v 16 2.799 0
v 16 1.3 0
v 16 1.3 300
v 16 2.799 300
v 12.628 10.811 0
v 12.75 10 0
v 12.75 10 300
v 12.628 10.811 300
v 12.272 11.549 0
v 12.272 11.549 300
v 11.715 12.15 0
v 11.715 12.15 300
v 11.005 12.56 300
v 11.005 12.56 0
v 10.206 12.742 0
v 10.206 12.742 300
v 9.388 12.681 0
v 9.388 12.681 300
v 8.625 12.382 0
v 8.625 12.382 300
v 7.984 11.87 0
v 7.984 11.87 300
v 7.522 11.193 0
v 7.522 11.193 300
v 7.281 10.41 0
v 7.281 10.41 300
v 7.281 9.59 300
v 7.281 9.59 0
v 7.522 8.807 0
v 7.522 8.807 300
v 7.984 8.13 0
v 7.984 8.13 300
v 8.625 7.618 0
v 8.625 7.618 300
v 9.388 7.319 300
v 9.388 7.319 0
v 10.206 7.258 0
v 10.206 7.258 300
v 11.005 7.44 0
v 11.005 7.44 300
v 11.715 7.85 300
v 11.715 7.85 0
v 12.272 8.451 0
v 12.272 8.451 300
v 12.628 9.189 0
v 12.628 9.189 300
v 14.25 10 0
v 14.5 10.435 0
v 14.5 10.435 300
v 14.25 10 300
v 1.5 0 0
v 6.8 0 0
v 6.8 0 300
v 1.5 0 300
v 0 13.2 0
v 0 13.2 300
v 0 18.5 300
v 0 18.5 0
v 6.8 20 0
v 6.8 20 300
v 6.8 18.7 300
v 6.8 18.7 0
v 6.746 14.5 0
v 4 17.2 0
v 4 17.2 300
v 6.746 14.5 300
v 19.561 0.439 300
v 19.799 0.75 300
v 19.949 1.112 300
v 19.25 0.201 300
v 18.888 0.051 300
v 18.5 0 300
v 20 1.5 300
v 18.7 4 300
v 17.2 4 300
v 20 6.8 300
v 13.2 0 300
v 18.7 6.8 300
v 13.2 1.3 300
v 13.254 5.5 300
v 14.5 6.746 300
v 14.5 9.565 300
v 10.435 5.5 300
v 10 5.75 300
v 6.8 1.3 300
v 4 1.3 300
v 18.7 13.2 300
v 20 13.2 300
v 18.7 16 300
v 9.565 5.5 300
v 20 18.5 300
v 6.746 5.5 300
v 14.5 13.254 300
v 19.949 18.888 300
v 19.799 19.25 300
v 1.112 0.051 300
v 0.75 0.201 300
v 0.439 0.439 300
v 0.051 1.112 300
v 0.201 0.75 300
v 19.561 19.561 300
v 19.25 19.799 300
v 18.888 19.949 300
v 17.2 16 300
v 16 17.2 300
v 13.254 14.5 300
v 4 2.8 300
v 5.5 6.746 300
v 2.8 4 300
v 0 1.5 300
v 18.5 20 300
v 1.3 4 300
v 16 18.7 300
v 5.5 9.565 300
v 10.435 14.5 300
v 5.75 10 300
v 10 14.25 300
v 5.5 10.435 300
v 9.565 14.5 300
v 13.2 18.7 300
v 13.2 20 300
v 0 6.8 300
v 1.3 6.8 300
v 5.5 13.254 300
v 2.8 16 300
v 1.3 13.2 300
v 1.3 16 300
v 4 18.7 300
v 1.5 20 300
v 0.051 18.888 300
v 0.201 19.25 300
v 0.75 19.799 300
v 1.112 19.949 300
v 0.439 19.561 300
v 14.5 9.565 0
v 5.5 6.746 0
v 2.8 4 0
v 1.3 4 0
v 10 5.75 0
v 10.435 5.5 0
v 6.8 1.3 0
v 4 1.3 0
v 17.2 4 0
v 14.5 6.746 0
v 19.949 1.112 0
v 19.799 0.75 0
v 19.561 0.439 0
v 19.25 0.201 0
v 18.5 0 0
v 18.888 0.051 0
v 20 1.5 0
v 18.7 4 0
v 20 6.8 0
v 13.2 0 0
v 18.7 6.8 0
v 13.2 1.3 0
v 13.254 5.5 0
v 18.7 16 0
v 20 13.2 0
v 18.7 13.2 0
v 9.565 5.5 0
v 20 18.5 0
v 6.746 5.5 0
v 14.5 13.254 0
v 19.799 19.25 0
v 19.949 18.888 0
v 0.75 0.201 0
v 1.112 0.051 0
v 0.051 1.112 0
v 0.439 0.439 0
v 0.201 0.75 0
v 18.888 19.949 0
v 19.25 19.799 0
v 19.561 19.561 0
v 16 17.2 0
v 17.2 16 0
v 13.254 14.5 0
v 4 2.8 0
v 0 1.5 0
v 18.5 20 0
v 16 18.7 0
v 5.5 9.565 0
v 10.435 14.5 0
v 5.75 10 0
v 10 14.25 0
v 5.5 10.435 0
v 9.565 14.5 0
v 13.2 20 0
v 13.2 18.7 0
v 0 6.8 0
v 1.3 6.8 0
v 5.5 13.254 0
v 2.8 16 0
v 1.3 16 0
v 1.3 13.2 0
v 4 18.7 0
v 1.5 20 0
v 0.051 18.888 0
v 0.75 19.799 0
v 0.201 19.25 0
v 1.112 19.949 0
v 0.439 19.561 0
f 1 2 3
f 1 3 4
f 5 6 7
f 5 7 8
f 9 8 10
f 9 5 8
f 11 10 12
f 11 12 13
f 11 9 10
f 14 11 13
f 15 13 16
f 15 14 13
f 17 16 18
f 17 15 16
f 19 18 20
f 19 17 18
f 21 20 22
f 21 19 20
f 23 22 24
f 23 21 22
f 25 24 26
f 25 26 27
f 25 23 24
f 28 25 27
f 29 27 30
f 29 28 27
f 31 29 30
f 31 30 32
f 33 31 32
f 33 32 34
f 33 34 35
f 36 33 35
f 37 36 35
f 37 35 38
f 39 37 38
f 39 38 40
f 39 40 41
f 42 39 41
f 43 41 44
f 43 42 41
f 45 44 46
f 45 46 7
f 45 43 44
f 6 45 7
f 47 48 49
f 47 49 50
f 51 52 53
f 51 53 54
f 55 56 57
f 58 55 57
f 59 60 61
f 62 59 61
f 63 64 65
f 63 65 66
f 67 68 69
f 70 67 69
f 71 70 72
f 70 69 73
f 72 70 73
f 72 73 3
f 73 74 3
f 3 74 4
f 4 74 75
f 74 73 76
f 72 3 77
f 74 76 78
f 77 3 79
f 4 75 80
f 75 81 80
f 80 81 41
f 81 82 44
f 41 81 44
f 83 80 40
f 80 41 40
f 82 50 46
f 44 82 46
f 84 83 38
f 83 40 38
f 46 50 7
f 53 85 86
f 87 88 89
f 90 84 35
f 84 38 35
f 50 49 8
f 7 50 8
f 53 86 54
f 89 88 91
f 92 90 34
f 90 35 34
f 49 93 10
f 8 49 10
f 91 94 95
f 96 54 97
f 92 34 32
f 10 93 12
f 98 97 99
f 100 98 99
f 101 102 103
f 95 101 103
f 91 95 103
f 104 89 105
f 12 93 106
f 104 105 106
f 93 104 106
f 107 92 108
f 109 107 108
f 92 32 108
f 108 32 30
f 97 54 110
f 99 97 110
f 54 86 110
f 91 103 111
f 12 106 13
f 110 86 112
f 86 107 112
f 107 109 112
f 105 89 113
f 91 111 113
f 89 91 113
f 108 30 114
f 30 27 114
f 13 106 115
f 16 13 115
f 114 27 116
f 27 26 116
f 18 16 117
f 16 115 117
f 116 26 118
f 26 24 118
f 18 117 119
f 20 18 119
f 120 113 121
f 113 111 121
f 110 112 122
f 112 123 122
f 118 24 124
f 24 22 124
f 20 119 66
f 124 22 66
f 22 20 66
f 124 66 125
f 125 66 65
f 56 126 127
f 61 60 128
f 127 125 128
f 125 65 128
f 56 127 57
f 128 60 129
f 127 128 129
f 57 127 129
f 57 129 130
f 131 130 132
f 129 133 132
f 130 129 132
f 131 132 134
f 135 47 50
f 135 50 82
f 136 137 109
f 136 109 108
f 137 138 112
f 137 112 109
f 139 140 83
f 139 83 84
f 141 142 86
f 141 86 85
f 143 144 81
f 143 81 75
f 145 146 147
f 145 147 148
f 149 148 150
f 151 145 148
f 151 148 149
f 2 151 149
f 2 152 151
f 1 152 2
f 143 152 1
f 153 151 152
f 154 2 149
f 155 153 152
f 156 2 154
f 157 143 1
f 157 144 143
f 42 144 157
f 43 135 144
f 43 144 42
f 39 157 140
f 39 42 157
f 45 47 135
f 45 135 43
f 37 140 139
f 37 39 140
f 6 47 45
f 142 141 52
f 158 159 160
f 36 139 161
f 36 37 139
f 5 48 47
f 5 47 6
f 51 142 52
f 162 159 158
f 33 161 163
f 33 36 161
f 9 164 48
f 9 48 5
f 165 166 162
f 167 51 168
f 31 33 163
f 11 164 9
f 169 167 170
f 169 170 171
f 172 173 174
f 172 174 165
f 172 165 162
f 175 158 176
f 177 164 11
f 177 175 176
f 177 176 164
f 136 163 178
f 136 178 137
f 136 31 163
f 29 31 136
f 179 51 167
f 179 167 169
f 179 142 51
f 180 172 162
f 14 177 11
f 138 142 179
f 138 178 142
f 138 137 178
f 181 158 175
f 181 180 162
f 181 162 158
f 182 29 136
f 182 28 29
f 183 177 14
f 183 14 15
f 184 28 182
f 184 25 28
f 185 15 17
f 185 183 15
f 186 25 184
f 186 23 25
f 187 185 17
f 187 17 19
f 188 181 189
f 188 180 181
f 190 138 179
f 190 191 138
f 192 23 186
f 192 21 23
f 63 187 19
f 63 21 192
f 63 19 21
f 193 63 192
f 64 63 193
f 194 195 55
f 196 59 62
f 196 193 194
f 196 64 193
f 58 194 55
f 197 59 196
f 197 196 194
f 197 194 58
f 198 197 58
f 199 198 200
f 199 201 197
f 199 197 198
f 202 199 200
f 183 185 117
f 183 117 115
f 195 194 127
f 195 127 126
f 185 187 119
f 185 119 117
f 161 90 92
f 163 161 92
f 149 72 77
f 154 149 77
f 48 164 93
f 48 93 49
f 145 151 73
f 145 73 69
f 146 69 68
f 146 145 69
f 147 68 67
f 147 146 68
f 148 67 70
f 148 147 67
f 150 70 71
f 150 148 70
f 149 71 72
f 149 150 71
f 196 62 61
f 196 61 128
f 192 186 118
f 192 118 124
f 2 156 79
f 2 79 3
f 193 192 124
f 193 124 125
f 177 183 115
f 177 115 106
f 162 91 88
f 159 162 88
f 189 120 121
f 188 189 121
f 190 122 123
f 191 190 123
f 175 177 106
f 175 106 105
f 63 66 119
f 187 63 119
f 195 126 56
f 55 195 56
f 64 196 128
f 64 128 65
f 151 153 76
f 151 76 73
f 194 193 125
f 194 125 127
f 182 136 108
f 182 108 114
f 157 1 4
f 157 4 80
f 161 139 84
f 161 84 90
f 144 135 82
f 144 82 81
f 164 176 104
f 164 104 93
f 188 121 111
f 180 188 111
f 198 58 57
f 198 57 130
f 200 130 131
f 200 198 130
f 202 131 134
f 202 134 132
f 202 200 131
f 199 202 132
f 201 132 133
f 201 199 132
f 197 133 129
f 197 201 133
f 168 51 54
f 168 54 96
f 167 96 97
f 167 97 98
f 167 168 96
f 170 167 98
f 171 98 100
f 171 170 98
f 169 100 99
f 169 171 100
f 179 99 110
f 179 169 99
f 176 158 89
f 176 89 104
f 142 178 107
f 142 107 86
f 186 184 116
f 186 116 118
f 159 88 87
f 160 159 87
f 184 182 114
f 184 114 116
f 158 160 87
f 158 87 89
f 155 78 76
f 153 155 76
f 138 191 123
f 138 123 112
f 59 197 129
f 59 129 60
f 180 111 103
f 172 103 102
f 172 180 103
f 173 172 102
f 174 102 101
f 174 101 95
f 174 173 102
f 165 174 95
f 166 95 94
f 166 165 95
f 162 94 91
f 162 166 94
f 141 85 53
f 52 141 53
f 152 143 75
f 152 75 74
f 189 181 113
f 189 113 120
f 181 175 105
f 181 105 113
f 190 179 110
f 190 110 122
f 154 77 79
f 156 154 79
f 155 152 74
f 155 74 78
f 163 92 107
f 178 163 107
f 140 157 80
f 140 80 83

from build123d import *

# Parameters (mm, degrees)
MODEL_R             = 2.75
BOSS_EXTRUDE1_DEPTH = 300


with BuildPart() as part:
    # Model → Boss-Extrude1 (new body)
    with BuildSketch(Plane.XY):
        with BuildLine():
            Line((1.499999935, 19.99999323), (6.799999935, 19.99999323))
            Line((6.799999935, 19.99999323), (6.799999935, 18.69999323))
            Line((6.799999935, 18.69999323), (3.999999935, 18.69999323))
            Line((3.999999935, 18.69999323), (3.999999935, 17.19999323))
            Line((3.999999935, 17.19999323), (6.745762647, 14.5))
            Line((6.745762647, 14.5), (9.565216879, 14.5))
            Line((9.565216879, 14.5), (10, 14.25))
            Line((10, 14.25), (10.434782606, 14.5))
            Line((10.434782606, 14.5), (13.254244108, 14.5))
            Line((13.254244108, 14.5), (15.999999935, 17.19999323))
            Line((15.999999935, 17.19999323), (15.999999935, 18.69999323))
            Line((15.999999935, 18.69999323), (13.199999935, 18.69999323))
            Line((13.199999935, 18.69999323), (13.199999935, 19.99999323))
            Line((13.199999935, 19.99999323), (18.499999935, 19.99999323))
            ThreePointArc((18.499999935, 19.99999323), (19.560660107, 19.560653402), (19.999999935, 18.49999323))
            Line((19.999999935, 18.49999323), (19.999999935, 13.19999323))
            Line((19.999999935, 13.19999323), (18.699999935, 13.19999323))
            Line((18.699999935, 13.19999323), (18.699999935, 15.99999323))
            Line((18.699999935, 15.99999323), (17.199999935, 15.99999323))
            Line((17.199999935, 15.99999323), (14.500000065, 13.254230518))
            Line((14.500000065, 13.254230518), (14.500000065, 10.434776138))
            Line((14.500000065, 10.434776138), (14.250000065, 9.99999323))
            Line((14.250000065, 9.99999323), (14.500000065, 9.565210911))
            Line((14.500000065, 9.565210911), (14.500000065, 6.745755942))
            Line((14.500000065, 6.745755942), (17.199999935, 3.99999323))
            Line((17.199999935, 3.99999323), (18.699999935, 3.99999323))
            Line((18.699999935, 3.99999323), (18.699999935, 6.79999323))
            Line((18.699999935, 6.79999323), (19.999999935, 6.79999323))
            Line((19.999999935, 6.79999323), (19.999999935, 1.49999323))
            ThreePointArc((19.999999935, 1.49999323), (19.560660107, 0.439333058), (18.499999935, -6.77e-06))
            Line((18.499999935, -6.77e-06), (13.199999935, -6.77e-06))
            Line((13.199999935, -6.77e-06), (13.199999935, 1.29999323))
            Line((13.199999935, 1.29999323), (15.999999935, 1.29999323))
            Line((15.999999935, 1.29999323), (15.999999935, 2.798703306))
            Line((15.999999935, 2.798703306), (13.254126104, 5.49999323))
            Line((13.254126104, 5.49999323), (10.434782606, 5.49999323))
            Line((10.434782606, 5.49999323), (10, 5.74999323))
            Line((10, 5.74999323), (9.565216879, 5.49999323))
            Line((9.565216879, 5.49999323), (6.745762647, 5.49999323))
            Line((6.745762647, 5.49999323), (3.999999935, 2.79999323))
            Line((3.999999935, 2.79999323), (3.999999935, 1.29999323))
            Line((3.999999935, 1.29999323), (6.799999935, 1.29999323))
            Line((6.799999935, 1.29999323), (6.799999935, -6.77e-06))
            Line((6.799999935, -6.77e-06), (1.499999935, -6.77e-06))
            ThreePointArc((1.499999935, -6.77e-06), (0.439339764, 0.439333058), (-6.5e-08, 1.49999323))
            Line((-6.5e-08, 1.49999323), (-6.5e-08, 6.79999323))
            Line((-6.5e-08, 6.79999323), (1.299999935, 6.79999323))
            Line((1.299999935, 6.79999323), (1.299999935, 3.99999323))
            Line((1.299999935, 3.99999323), (2.799999935, 3.99999323))
            Line((2.799999935, 3.99999323), (5.499999935, 6.745755942))
            Line((5.499999935, 6.745755942), (5.499999935, 9.565210911))
            Line((5.499999935, 9.565210911), (5.749999935, 9.99999323))
            Line((5.749999935, 9.99999323), (5.499999935, 10.434776138))
            Line((5.499999935, 10.434776138), (5.499999935, 13.254230518))
            Line((5.499999935, 13.254230518), (2.799999935, 15.99999323))
            Line((2.799999935, 15.99999323), (1.299999935, 15.99999323))
            Line((1.299999935, 15.99999323), (1.299999935, 13.19999323))
            Line((1.299999935, 13.19999323), (-6.5e-08, 13.19999323))
            Line((-6.5e-08, 13.19999323), (-6.5e-08, 18.49999323))
            ThreePointArc((-6.5e-08, 18.49999323), (0.439339764, 19.560653402), (1.499999935, 19.99999323))
        make_face()
        with Locations((10, 10)):
            Circle(MODEL_R, mode=Mode.SUBTRACT)
    extrude(amount=BOSS_EXTRUDE1_DEPTH)


solid = part.part
